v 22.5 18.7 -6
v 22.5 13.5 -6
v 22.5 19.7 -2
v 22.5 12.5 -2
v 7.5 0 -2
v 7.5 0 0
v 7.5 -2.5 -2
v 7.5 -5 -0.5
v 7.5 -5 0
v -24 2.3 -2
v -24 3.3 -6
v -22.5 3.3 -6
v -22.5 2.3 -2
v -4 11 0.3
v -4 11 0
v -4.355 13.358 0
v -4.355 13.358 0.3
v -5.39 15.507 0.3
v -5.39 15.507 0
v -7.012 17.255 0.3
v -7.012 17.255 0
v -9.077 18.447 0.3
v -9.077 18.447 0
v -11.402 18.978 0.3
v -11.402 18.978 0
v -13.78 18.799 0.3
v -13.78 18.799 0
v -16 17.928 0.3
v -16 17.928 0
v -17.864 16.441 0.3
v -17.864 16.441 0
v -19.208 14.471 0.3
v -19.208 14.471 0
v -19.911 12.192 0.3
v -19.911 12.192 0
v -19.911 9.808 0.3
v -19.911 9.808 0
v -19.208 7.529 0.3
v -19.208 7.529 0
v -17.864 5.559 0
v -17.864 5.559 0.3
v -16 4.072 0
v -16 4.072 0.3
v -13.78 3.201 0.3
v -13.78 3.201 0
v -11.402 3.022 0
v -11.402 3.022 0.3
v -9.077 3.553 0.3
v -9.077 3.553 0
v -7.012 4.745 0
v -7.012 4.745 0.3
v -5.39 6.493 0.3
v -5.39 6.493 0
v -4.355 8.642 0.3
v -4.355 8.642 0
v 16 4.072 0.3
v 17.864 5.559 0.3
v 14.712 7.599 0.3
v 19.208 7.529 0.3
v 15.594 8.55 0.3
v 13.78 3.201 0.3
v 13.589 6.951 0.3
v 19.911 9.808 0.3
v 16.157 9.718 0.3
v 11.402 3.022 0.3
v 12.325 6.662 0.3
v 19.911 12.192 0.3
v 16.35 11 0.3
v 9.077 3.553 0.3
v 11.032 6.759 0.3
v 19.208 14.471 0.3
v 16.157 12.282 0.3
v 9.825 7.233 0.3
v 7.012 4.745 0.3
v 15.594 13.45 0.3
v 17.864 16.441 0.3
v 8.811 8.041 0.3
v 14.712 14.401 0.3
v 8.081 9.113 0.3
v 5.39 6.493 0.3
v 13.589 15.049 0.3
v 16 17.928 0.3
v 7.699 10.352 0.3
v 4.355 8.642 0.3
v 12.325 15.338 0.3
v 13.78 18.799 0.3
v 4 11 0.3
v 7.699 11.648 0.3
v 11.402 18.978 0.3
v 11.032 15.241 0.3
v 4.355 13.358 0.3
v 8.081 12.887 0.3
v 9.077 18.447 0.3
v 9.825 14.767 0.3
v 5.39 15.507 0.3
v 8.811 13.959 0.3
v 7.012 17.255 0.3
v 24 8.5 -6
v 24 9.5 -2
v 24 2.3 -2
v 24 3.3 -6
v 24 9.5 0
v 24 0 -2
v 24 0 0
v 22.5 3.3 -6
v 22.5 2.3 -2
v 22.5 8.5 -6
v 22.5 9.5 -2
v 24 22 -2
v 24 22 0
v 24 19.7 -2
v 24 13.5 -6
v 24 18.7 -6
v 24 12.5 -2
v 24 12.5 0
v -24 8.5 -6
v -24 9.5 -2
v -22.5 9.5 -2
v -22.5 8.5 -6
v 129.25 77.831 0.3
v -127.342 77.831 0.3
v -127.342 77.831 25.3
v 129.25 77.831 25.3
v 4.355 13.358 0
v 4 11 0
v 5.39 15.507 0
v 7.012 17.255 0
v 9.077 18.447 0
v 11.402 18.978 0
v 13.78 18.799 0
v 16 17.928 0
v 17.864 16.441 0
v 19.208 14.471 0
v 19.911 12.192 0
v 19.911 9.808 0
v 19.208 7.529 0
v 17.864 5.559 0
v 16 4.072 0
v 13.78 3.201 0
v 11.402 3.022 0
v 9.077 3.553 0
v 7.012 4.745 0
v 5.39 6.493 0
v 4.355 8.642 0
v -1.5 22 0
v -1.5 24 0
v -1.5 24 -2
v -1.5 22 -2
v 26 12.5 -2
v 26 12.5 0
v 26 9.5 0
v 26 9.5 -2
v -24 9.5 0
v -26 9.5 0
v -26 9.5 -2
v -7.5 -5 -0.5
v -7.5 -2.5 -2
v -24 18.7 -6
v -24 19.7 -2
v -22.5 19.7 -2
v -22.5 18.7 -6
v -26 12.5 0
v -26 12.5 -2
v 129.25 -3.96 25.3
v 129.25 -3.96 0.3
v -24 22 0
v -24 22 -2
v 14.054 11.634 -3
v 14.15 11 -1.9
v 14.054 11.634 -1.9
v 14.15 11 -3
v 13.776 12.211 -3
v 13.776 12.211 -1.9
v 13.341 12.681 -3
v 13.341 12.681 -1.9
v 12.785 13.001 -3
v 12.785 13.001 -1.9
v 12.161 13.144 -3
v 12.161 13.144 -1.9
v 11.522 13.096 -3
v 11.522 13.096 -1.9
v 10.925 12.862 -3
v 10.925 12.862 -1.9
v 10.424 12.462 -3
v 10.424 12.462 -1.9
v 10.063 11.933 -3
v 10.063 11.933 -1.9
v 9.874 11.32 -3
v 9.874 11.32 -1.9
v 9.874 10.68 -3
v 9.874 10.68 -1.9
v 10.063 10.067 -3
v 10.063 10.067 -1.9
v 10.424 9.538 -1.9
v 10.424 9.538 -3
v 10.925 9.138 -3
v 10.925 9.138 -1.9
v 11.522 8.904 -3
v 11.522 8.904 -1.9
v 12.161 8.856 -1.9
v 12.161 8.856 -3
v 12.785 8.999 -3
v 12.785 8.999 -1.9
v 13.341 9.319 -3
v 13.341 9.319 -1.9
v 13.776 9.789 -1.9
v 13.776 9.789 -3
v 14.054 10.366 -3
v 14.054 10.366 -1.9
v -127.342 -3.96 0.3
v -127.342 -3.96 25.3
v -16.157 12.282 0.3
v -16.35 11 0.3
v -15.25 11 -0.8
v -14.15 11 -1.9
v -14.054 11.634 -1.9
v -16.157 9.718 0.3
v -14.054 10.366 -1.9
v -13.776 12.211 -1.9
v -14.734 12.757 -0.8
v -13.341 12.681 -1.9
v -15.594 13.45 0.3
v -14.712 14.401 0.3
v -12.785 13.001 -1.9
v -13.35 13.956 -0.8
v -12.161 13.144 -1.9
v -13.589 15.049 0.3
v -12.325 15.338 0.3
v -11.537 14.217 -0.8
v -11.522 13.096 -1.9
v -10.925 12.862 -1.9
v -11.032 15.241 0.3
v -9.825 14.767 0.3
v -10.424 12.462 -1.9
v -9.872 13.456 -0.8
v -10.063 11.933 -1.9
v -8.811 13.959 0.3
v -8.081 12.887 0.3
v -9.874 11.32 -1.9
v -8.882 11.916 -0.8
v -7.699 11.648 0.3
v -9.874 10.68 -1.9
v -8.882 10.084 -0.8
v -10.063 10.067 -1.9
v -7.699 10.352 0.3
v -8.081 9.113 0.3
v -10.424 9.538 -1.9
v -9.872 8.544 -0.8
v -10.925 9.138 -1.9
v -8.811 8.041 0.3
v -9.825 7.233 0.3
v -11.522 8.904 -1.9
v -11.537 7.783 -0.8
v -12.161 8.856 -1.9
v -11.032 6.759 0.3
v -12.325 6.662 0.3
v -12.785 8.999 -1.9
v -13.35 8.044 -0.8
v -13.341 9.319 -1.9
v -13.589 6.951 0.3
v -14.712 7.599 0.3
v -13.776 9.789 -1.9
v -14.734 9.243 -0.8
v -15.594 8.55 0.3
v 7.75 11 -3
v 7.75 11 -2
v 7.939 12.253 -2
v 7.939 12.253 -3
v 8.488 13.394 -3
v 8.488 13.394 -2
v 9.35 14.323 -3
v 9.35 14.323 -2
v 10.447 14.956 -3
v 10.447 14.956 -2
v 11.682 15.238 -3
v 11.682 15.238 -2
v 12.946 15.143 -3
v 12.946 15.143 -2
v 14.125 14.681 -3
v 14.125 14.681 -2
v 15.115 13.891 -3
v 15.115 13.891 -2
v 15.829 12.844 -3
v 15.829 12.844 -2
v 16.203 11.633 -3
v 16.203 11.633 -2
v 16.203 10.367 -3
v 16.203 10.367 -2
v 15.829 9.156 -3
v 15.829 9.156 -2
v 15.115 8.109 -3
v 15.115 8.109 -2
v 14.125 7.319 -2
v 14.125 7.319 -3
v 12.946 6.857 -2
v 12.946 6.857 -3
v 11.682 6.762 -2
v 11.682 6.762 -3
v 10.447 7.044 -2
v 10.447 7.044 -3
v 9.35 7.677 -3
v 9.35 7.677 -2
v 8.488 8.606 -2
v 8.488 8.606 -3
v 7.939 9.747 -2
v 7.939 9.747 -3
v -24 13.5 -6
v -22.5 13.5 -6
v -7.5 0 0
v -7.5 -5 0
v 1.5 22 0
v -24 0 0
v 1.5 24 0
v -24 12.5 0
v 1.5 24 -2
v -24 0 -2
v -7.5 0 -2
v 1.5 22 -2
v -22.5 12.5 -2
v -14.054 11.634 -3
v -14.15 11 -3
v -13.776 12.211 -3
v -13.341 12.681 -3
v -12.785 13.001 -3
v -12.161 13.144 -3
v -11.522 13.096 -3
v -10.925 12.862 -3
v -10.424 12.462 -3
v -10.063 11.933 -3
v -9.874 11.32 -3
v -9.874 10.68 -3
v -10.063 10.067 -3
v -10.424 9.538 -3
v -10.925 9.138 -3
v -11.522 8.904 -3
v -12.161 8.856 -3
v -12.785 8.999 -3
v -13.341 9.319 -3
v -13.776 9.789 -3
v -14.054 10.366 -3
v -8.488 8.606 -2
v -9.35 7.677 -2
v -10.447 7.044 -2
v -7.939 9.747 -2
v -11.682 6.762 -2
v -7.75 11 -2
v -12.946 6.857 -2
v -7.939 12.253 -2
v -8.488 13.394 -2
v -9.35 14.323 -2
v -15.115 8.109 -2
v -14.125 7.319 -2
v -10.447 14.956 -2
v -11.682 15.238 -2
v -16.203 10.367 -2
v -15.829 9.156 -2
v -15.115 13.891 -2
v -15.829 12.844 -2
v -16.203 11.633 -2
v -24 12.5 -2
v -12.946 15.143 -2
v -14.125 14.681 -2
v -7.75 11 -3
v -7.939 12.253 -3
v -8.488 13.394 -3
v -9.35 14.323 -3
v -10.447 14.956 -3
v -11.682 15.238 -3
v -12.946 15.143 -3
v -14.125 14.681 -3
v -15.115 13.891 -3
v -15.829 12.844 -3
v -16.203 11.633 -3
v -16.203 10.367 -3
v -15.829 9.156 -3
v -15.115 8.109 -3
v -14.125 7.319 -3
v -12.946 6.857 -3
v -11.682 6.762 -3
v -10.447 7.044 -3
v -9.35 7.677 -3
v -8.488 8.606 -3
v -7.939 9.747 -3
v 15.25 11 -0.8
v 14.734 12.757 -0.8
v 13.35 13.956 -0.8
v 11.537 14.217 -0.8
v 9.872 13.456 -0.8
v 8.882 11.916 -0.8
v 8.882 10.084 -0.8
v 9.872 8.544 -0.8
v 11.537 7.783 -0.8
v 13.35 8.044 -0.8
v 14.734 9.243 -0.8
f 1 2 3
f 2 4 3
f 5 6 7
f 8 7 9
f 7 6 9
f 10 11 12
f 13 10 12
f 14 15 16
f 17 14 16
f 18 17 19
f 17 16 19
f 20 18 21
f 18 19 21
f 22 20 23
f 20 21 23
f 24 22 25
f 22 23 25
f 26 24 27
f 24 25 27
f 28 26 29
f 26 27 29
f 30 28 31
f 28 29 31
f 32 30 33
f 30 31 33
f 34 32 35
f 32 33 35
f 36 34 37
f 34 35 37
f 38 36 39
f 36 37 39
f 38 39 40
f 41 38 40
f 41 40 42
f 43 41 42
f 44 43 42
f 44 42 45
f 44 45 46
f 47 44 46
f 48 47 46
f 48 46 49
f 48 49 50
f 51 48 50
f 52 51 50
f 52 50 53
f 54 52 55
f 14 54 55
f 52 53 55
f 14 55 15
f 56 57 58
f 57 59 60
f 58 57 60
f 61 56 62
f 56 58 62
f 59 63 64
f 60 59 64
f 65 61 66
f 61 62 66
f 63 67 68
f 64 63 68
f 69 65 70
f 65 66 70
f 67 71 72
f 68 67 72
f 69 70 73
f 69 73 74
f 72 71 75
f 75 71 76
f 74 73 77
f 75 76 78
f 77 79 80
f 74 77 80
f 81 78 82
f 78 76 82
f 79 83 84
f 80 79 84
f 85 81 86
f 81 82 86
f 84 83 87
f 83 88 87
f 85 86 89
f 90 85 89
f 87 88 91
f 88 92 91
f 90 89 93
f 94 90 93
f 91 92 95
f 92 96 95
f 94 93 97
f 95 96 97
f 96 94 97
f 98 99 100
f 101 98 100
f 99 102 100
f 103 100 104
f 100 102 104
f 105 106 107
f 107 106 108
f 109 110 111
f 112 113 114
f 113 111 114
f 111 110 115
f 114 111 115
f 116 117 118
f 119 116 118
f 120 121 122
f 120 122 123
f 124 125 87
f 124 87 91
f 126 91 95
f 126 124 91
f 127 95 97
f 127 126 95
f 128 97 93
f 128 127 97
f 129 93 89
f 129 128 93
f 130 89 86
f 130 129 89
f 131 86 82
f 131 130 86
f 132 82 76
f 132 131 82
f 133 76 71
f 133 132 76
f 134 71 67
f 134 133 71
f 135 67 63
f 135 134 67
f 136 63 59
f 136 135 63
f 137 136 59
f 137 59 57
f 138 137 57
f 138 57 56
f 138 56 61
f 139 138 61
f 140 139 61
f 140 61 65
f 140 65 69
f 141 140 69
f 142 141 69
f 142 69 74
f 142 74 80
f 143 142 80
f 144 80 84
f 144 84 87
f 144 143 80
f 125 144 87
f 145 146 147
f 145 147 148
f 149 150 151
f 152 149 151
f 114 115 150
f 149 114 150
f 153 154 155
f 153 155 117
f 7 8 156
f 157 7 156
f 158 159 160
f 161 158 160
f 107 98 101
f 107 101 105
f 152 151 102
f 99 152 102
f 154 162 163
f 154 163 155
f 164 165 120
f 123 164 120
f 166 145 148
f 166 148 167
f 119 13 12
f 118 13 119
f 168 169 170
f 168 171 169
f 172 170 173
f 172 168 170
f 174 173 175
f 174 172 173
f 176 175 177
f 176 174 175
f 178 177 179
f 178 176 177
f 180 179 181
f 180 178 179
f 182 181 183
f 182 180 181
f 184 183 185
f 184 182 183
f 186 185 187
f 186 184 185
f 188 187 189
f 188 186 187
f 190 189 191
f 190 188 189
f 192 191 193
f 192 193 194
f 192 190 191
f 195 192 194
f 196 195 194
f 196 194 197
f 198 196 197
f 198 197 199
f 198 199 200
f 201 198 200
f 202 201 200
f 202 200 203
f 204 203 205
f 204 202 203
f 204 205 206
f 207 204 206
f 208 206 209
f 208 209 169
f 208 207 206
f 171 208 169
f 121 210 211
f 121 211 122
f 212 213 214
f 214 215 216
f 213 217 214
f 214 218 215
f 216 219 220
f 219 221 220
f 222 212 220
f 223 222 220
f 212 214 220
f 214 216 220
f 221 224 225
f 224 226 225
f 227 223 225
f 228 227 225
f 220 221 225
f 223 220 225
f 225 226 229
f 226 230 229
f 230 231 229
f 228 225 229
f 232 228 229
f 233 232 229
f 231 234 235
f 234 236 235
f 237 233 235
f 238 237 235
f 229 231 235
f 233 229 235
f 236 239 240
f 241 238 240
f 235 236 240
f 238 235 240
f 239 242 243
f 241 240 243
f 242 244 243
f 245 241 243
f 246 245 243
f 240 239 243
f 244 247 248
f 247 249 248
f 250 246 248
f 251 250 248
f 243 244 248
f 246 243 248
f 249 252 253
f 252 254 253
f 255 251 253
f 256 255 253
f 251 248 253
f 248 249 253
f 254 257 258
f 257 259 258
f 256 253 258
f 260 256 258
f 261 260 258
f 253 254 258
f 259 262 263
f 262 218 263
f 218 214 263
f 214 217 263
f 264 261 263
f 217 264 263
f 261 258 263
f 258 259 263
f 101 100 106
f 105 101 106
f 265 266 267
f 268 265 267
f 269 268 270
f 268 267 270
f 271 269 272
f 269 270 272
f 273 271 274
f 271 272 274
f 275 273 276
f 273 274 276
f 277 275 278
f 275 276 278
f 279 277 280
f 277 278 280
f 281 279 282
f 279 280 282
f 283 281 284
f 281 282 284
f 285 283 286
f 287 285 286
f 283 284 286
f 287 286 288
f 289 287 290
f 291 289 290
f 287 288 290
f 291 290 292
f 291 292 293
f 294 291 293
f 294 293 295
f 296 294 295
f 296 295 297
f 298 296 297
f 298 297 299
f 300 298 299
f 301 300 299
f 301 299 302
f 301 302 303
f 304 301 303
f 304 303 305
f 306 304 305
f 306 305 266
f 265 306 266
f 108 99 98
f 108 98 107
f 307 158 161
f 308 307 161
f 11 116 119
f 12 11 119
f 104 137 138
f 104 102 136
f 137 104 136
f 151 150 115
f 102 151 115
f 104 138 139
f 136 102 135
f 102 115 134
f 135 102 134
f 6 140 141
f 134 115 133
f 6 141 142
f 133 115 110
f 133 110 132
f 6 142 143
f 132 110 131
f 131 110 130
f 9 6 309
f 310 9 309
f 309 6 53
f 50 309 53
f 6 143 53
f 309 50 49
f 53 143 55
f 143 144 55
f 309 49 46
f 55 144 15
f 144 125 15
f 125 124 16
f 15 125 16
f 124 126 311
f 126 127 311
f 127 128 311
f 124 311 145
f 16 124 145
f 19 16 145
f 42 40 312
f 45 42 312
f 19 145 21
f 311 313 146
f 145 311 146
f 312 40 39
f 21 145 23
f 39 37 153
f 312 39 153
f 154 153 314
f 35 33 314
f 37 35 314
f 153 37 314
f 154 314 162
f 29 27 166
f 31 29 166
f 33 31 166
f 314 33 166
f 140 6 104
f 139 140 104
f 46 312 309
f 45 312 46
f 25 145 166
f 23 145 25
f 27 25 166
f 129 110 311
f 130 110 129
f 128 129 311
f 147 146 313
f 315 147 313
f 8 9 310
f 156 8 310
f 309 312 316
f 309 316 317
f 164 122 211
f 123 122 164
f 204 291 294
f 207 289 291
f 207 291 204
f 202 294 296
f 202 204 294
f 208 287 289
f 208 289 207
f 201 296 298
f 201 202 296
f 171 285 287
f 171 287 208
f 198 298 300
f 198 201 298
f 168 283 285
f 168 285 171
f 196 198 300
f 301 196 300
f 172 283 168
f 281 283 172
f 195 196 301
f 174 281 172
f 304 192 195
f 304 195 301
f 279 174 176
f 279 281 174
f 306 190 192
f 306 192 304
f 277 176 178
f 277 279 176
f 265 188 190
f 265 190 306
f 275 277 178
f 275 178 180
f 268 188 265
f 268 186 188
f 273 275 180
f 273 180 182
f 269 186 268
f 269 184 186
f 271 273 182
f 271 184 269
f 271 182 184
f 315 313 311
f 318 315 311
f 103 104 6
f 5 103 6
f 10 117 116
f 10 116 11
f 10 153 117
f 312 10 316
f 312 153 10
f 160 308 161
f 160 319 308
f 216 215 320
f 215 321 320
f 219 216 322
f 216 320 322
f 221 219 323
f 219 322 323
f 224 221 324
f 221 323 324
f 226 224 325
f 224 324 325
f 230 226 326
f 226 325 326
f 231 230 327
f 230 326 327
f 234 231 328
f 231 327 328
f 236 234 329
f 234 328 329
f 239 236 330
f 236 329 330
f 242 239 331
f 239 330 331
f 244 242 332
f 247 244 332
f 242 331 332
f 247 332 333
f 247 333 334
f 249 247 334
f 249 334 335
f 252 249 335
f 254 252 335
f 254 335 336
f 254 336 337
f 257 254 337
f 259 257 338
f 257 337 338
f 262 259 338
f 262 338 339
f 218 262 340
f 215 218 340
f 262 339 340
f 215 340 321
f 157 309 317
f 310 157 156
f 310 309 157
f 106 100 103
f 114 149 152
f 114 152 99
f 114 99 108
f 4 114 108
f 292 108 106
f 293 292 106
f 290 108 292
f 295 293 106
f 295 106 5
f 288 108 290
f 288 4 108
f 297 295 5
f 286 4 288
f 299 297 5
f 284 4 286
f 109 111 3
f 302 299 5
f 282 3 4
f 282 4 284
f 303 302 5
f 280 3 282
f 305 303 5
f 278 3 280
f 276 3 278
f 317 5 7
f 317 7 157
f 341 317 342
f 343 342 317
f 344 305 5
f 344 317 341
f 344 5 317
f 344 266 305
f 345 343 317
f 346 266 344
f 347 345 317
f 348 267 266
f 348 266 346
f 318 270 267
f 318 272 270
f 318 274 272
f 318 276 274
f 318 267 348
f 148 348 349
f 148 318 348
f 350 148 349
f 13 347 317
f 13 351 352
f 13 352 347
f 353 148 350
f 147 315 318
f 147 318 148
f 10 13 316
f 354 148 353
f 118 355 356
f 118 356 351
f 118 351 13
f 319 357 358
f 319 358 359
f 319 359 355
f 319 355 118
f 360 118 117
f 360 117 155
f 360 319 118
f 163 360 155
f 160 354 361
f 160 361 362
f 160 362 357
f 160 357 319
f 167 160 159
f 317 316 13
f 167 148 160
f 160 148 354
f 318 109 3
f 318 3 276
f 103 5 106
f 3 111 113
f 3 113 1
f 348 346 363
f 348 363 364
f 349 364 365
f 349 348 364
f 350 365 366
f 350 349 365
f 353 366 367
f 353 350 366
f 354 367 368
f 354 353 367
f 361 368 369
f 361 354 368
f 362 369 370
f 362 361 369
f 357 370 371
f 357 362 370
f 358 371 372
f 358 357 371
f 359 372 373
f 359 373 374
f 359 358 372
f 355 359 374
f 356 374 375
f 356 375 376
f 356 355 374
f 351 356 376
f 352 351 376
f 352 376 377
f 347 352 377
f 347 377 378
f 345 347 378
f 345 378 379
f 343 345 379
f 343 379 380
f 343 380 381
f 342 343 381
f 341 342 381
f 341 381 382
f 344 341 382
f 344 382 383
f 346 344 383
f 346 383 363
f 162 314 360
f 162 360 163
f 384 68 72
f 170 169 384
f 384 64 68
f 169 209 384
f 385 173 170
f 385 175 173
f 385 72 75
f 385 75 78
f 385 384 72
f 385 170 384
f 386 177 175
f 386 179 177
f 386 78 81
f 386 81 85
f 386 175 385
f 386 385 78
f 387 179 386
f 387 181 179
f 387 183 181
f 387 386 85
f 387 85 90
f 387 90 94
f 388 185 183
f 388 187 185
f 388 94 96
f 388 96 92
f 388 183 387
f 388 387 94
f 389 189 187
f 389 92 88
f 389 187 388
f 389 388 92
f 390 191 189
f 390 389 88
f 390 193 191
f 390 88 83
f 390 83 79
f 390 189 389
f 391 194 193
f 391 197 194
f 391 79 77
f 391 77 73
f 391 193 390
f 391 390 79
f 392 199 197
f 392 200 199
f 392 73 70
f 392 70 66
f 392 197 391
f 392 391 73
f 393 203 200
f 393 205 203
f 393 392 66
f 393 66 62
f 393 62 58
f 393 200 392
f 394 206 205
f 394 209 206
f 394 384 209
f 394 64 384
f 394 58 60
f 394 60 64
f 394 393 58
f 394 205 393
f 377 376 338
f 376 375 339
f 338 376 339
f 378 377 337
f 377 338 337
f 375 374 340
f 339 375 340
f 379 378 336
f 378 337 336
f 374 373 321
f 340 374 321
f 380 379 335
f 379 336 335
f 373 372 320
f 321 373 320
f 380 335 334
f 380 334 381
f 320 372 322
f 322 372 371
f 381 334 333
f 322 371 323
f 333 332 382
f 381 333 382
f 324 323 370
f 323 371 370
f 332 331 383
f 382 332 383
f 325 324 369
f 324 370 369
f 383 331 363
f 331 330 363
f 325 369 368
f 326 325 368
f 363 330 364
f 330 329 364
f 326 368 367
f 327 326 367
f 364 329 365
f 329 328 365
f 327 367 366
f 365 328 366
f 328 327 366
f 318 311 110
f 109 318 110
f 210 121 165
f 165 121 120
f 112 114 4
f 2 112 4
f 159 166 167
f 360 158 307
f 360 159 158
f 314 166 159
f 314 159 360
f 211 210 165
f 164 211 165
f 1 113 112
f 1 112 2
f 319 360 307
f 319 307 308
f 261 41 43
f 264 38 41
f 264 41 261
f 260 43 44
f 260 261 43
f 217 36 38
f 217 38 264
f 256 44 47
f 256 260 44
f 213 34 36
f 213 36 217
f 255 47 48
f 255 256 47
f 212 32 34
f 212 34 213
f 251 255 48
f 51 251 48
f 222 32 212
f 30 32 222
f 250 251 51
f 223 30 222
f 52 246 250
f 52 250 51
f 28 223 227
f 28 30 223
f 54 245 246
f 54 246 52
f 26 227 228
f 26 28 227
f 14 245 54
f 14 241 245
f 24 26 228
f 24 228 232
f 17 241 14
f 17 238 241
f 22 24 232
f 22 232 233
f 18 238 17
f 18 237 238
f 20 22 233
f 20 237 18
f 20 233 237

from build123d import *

# Parameters (mm, degrees)
F11_DEPTH       = 2
F12_W           = 1.5
F12_H           = 7.2
F13_DEPTH       = 6
F14_R           = 4.25
F15_DEPTH       = 3
F16_R           = 8
F17_DEPTH       = 0.3
F19_D           = 4.3
F19_CSINK_D     = 8.7
F19_CSINK_ANGLE = 90
F20_SIZE2       = 1.5
F20_SIZE        = 2.5
F21_SIZE2       = 3.99999
F21_SIZE        = 0.99999
F21_2_SIZE2     = 3.99999
F21_2_SIZE      = 0.99999
F22_SIZE2       = 3.99999
F22_SIZE        = 0.99999
F24_W           = 256.5929293633
F24_H           = 81.7903461866
F25_DEPTH       = 25


# Not quite as in the source:
# - a fillet or chamfer is up to 0.001 mm smaller than in the source, because OpenCascade refuses the exact size


with BuildPart() as f11:
    # F10 (on Top) → F11 (new body, through all)
    with BuildSketch(Plane.XY):
        Polygon((-24, 0), (-7.5, 0), (-7.5, -5), (0, -5), (0, 24), (-1.5, 24), (-1.5, 22), (-24, 22), (-24, 12.5), (-26, 12.5), (-26, 9.5), (-24, 9.5), align=None)
    extrude(amount=-F11_DEPTH)

    # F12 (on Top) → F13 (join, through all)
    with BuildSketch(Plane.XY):
        with Locations((-23.25, 5.9)):
            Rectangle(F12_W, F12_H)
        with Locations((-23.25, 16.1)):
            Rectangle(F12_W, F12_H)
    extrude(amount=-F13_DEPTH)

    # F14 (on Top) → F15 (join, through all)
    with BuildSketch(Plane.XY):
        with Locations((-12, 11)):
            Circle(F14_R)
    extrude(amount=-F15_DEPTH)

    # F16 (on Top) → F17 (join, through all)
    with BuildSketch(Plane.XY):
        with Locations((-12, 11)):
            Circle(F16_R)
    extrude(amount=F17_DEPTH)

    # F19 (through all)
    with Locations(Plane.XY.offset(0.3)):
        with Locations((-12, 11)):
            CounterSinkHole(F19_D / 2, F19_CSINK_D / 2, counter_sink_angle=F19_CSINK_ANGLE)

    # F20
    f20_edges = [f11.edges().sort_by_distance(p)[0] for p in [
        (-3.75, -5, -2),
    ]]
    f20_side = f11.faces().sort_by_distance((-23.610513, 1.15, -2))[0]
    chamfer(f20_edges, length=F20_SIZE, length2=F20_SIZE2, reference=f20_side)

    # F21 (size 1 and 4 in the source; OpenCascade refuses exactly that, so slightly less here)
    f21_edges = [f11.edges().sort_by_distance(p)[0] for p in [
        (-23.25, 2.3, -6),
        (-23.25, 9.5, -6),
    ]]
    f21_side = f11.faces().sort_by_distance((-23.25, 5.9, -6))[0]
    chamfer(f21_edges, length=F21_SIZE, length2=F21_SIZE2, reference=f21_side)

    # F21#2 (size 1 and 4 in the source; OpenCascade refuses exactly that, so slightly less here)
    f21_2_edges = [f11.edges().sort_by_distance(p)[0] for p in [
        (-23.25, 12.5, -6),
    ]]
    f21_2_side = f11.faces().sort_by_distance((-23.25, 16.1, -6))[0]
    chamfer(f21_2_edges, length=F21_2_SIZE, length2=F21_2_SIZE2, reference=f21_2_side)

    # F22 (size 1 and 4 in the source; OpenCascade refuses exactly that, so slightly less here)
    f22_edges = [f11.edges().sort_by_distance(p)[0] for p in [
        (-23.25, 19.7, -6),
    ]]
    f22_side = f11.faces().sort_by_distance((-23.25, 16.599995, -6))[0]
    chamfer(f22_edges, length=F22_SIZE, length2=F22_SIZE2, reference=f22_side)

    # F23: F11 across plane


with BuildPart() as f11_1:
    add(f11.part)
    add(f11.part.mirror(Plane.YZ))


with BuildPart() as f25:
    # F24 (on offset) → F25 (new body)
    with BuildSketch(Plane.XY.offset(0.3)):
        with Locations((0.9540170431, 36.935655633)):
            Rectangle(F24_W, F24_H)
    extrude(amount=F25_DEPTH)


solid = Compound([f11_1.part, f25.part])
